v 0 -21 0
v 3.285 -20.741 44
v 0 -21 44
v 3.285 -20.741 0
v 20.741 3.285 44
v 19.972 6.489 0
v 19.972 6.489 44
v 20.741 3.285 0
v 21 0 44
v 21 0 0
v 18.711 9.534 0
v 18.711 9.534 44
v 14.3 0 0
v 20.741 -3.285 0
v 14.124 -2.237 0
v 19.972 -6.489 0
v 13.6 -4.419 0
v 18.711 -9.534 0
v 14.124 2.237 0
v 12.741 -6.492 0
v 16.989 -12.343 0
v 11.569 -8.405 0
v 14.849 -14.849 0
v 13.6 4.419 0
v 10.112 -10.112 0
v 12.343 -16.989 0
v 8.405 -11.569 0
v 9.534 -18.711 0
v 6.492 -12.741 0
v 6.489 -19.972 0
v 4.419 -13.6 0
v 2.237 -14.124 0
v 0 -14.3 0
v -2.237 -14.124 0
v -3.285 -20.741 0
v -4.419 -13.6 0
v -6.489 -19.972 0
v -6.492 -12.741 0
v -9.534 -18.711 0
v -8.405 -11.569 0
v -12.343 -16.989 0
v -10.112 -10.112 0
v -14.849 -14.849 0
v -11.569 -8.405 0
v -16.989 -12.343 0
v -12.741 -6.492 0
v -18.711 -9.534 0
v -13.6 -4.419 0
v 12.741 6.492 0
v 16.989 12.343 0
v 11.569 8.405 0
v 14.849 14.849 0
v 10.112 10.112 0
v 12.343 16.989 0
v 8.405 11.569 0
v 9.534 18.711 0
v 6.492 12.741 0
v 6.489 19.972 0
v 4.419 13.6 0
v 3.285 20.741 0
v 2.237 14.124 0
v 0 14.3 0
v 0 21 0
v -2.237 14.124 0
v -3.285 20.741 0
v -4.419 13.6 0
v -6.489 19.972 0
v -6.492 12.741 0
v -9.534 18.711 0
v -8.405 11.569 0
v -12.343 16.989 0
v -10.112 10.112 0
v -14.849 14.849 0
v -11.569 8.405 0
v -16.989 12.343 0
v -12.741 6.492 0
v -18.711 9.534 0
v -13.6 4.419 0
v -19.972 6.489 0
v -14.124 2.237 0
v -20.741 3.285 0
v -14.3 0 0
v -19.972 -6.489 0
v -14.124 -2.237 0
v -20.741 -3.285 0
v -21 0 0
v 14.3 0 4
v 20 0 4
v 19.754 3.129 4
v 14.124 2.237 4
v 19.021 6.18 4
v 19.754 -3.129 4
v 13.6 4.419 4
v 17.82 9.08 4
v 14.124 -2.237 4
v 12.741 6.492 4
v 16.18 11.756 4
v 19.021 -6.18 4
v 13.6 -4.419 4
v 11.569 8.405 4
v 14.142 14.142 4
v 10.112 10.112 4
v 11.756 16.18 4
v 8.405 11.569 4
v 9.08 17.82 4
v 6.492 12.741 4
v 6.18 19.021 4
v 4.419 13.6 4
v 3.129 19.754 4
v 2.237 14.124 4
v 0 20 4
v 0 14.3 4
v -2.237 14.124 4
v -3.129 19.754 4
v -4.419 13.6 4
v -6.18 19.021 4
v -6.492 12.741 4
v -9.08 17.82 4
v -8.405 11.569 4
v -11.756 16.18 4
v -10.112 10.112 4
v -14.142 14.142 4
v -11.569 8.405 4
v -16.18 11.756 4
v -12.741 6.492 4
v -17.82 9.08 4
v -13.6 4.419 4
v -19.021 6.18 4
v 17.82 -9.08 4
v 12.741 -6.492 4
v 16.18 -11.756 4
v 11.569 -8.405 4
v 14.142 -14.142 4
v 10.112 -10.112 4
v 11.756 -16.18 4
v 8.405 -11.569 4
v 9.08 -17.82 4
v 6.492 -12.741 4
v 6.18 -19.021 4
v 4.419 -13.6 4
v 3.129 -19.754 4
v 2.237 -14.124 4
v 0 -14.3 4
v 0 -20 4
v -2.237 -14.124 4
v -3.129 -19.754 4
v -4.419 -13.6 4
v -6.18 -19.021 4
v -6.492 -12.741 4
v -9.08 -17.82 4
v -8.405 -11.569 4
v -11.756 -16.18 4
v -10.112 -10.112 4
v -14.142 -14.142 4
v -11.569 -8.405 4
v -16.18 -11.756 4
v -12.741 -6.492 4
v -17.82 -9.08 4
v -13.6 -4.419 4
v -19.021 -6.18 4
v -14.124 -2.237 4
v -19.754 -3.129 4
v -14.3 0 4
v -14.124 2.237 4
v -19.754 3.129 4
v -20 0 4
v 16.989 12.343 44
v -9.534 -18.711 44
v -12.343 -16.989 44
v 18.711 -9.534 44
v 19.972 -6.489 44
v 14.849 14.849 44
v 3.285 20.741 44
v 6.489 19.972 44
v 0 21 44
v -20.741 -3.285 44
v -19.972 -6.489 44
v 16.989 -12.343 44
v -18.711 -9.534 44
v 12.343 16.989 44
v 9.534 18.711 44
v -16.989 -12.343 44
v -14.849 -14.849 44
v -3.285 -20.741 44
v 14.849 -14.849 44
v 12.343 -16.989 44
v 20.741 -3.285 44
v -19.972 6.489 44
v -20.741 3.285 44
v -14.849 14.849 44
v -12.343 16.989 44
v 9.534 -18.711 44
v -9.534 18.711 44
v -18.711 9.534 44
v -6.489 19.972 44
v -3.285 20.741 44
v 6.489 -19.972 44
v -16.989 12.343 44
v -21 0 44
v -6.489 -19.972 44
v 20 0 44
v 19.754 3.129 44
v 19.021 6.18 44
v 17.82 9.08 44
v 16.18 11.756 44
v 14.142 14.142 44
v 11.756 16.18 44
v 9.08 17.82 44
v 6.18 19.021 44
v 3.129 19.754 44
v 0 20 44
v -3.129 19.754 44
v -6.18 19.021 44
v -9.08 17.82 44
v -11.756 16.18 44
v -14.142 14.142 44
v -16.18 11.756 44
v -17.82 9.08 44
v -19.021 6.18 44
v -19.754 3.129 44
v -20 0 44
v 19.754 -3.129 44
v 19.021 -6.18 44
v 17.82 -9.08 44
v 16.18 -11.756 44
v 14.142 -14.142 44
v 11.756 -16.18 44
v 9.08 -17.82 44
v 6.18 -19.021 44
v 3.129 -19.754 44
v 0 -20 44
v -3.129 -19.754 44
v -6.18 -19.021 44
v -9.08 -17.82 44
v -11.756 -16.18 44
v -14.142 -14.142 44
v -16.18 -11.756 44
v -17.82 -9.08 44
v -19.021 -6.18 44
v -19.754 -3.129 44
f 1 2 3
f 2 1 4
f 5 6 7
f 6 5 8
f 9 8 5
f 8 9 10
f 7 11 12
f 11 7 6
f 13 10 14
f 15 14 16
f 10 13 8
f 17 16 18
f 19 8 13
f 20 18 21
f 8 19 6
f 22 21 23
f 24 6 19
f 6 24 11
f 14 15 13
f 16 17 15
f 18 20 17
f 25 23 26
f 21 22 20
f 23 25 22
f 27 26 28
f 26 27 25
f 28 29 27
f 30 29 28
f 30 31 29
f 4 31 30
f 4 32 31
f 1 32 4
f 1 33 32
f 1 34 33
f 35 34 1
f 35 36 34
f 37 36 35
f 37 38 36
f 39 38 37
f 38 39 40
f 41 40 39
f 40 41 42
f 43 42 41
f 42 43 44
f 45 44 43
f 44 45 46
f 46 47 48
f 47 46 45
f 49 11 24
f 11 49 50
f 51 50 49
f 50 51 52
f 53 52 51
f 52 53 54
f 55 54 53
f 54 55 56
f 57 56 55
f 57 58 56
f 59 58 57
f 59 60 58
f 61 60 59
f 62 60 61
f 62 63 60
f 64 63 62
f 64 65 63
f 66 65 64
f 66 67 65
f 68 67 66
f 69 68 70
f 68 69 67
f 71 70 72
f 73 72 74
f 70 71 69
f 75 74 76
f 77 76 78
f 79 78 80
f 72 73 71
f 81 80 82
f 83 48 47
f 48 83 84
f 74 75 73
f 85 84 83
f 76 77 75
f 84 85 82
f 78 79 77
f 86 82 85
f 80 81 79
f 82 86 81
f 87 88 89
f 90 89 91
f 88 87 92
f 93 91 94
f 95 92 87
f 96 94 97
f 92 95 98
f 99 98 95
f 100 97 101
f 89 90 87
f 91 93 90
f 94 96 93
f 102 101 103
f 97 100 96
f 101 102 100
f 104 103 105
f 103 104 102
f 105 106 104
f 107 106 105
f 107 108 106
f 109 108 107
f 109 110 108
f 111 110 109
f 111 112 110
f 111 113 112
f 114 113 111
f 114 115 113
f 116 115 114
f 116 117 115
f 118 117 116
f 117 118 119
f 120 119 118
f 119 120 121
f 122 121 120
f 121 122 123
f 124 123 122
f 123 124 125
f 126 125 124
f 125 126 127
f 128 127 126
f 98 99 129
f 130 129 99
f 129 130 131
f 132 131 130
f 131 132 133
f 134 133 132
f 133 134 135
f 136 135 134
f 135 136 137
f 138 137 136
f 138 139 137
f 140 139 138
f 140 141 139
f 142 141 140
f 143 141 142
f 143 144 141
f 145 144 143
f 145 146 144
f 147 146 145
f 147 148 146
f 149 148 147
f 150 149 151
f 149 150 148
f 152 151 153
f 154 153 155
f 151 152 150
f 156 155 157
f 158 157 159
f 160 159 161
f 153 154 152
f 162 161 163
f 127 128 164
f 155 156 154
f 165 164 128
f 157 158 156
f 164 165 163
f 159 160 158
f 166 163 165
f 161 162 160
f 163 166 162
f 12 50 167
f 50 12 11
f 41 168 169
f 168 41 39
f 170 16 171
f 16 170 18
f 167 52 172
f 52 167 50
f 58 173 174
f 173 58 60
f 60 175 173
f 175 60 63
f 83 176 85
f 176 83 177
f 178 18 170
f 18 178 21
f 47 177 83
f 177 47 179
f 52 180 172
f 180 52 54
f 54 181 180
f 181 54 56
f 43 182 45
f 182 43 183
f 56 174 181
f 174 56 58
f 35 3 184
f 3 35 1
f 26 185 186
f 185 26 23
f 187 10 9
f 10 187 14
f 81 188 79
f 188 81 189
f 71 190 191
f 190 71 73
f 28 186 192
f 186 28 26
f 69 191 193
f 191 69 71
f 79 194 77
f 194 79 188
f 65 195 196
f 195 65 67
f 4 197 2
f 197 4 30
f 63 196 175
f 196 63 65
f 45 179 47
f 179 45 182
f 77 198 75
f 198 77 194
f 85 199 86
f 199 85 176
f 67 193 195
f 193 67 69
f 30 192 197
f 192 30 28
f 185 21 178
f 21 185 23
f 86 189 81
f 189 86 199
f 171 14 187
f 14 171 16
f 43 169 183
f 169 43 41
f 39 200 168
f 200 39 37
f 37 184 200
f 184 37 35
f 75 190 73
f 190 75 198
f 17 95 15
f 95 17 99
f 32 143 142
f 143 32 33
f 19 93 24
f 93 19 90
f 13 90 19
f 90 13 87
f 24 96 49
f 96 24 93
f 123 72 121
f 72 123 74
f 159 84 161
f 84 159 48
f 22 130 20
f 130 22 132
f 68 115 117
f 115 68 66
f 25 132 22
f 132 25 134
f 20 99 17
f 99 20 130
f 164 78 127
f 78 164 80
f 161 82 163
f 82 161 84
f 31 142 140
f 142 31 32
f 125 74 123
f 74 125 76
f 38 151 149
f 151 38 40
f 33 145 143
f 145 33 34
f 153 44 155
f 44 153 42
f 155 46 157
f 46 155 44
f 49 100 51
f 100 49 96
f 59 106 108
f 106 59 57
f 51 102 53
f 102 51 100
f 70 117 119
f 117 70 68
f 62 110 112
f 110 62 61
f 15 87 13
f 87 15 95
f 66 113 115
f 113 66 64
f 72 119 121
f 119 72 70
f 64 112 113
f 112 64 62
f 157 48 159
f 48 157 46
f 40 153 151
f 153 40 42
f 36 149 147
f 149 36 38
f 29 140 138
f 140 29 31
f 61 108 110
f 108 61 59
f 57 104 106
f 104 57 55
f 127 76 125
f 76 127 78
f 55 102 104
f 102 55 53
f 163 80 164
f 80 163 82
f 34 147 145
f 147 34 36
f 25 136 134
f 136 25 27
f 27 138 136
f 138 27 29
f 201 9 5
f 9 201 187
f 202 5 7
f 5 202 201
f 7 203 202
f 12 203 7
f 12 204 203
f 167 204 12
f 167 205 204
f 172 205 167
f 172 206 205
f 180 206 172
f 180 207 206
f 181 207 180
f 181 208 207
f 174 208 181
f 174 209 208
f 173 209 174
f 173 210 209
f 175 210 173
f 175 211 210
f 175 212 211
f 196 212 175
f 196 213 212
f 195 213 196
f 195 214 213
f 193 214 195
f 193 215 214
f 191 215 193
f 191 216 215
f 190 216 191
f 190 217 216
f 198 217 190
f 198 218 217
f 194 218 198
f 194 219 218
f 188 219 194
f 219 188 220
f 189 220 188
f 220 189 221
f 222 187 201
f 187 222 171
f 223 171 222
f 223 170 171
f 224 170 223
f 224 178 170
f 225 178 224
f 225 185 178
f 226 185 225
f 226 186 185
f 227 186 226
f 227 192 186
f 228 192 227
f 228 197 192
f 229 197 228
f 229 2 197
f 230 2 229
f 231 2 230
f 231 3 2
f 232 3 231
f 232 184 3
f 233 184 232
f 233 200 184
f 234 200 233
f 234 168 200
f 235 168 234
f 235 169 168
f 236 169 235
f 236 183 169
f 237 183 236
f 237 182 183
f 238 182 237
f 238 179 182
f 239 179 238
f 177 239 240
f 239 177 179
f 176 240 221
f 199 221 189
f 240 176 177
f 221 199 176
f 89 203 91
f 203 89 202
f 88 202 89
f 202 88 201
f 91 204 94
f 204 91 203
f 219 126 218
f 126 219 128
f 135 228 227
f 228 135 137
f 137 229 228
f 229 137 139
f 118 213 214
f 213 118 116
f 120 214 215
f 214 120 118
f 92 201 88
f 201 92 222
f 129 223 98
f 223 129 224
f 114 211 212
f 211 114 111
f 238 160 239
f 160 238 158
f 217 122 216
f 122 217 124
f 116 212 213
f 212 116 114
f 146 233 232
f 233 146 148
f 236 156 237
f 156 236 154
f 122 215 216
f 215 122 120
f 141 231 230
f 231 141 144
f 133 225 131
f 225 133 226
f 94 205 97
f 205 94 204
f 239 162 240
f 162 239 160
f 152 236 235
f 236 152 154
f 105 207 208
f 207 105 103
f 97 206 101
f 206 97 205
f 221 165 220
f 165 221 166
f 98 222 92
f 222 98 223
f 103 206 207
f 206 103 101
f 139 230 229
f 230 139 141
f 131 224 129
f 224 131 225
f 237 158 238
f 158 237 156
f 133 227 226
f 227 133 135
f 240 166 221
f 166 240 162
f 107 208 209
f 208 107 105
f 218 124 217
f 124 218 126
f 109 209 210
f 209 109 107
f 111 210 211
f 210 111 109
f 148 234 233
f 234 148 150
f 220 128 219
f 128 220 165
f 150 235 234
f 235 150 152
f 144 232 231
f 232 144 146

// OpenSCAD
// Ikea light mod v3 - 3 Rings - bottom - April 2,2016


///////// variables
basePlate_d=42;
basePlate_h=4;
basePlateSub_d=28.6;    // hole for ikea type G lamp stand
basePlateSub_h=basePlate_h+2;
//  inside tube
tube_d=42;
tube_h=40;
tubeSub_d=tube_d-2;
tubeSub_h=tube_h+2;

/////////  render

basePlateAssy();
translate([0,0,basePlate_h])
    tube();

module basePlateAssy() {
    difference() {
        color("blue")
            cylinder(d=basePlate_d, h=basePlate_h, center=false, $fn=40);
    translate([0,0,-1])
        color("red")
            cylinder(d=basePlateSub_d, h=basePlateSub_h, center=false, $fn=40); 
    }
}

module tube() {
    difference() {
            color("green")
                cylinder(d=tube_d, h=tube_h, center=false, $fn=40);
        translate([0,0,-1])
                color("red")
                    cylinder(d=tubeSub_d, h=tubeSub_h, center=false, $fn=40);
    }
}
